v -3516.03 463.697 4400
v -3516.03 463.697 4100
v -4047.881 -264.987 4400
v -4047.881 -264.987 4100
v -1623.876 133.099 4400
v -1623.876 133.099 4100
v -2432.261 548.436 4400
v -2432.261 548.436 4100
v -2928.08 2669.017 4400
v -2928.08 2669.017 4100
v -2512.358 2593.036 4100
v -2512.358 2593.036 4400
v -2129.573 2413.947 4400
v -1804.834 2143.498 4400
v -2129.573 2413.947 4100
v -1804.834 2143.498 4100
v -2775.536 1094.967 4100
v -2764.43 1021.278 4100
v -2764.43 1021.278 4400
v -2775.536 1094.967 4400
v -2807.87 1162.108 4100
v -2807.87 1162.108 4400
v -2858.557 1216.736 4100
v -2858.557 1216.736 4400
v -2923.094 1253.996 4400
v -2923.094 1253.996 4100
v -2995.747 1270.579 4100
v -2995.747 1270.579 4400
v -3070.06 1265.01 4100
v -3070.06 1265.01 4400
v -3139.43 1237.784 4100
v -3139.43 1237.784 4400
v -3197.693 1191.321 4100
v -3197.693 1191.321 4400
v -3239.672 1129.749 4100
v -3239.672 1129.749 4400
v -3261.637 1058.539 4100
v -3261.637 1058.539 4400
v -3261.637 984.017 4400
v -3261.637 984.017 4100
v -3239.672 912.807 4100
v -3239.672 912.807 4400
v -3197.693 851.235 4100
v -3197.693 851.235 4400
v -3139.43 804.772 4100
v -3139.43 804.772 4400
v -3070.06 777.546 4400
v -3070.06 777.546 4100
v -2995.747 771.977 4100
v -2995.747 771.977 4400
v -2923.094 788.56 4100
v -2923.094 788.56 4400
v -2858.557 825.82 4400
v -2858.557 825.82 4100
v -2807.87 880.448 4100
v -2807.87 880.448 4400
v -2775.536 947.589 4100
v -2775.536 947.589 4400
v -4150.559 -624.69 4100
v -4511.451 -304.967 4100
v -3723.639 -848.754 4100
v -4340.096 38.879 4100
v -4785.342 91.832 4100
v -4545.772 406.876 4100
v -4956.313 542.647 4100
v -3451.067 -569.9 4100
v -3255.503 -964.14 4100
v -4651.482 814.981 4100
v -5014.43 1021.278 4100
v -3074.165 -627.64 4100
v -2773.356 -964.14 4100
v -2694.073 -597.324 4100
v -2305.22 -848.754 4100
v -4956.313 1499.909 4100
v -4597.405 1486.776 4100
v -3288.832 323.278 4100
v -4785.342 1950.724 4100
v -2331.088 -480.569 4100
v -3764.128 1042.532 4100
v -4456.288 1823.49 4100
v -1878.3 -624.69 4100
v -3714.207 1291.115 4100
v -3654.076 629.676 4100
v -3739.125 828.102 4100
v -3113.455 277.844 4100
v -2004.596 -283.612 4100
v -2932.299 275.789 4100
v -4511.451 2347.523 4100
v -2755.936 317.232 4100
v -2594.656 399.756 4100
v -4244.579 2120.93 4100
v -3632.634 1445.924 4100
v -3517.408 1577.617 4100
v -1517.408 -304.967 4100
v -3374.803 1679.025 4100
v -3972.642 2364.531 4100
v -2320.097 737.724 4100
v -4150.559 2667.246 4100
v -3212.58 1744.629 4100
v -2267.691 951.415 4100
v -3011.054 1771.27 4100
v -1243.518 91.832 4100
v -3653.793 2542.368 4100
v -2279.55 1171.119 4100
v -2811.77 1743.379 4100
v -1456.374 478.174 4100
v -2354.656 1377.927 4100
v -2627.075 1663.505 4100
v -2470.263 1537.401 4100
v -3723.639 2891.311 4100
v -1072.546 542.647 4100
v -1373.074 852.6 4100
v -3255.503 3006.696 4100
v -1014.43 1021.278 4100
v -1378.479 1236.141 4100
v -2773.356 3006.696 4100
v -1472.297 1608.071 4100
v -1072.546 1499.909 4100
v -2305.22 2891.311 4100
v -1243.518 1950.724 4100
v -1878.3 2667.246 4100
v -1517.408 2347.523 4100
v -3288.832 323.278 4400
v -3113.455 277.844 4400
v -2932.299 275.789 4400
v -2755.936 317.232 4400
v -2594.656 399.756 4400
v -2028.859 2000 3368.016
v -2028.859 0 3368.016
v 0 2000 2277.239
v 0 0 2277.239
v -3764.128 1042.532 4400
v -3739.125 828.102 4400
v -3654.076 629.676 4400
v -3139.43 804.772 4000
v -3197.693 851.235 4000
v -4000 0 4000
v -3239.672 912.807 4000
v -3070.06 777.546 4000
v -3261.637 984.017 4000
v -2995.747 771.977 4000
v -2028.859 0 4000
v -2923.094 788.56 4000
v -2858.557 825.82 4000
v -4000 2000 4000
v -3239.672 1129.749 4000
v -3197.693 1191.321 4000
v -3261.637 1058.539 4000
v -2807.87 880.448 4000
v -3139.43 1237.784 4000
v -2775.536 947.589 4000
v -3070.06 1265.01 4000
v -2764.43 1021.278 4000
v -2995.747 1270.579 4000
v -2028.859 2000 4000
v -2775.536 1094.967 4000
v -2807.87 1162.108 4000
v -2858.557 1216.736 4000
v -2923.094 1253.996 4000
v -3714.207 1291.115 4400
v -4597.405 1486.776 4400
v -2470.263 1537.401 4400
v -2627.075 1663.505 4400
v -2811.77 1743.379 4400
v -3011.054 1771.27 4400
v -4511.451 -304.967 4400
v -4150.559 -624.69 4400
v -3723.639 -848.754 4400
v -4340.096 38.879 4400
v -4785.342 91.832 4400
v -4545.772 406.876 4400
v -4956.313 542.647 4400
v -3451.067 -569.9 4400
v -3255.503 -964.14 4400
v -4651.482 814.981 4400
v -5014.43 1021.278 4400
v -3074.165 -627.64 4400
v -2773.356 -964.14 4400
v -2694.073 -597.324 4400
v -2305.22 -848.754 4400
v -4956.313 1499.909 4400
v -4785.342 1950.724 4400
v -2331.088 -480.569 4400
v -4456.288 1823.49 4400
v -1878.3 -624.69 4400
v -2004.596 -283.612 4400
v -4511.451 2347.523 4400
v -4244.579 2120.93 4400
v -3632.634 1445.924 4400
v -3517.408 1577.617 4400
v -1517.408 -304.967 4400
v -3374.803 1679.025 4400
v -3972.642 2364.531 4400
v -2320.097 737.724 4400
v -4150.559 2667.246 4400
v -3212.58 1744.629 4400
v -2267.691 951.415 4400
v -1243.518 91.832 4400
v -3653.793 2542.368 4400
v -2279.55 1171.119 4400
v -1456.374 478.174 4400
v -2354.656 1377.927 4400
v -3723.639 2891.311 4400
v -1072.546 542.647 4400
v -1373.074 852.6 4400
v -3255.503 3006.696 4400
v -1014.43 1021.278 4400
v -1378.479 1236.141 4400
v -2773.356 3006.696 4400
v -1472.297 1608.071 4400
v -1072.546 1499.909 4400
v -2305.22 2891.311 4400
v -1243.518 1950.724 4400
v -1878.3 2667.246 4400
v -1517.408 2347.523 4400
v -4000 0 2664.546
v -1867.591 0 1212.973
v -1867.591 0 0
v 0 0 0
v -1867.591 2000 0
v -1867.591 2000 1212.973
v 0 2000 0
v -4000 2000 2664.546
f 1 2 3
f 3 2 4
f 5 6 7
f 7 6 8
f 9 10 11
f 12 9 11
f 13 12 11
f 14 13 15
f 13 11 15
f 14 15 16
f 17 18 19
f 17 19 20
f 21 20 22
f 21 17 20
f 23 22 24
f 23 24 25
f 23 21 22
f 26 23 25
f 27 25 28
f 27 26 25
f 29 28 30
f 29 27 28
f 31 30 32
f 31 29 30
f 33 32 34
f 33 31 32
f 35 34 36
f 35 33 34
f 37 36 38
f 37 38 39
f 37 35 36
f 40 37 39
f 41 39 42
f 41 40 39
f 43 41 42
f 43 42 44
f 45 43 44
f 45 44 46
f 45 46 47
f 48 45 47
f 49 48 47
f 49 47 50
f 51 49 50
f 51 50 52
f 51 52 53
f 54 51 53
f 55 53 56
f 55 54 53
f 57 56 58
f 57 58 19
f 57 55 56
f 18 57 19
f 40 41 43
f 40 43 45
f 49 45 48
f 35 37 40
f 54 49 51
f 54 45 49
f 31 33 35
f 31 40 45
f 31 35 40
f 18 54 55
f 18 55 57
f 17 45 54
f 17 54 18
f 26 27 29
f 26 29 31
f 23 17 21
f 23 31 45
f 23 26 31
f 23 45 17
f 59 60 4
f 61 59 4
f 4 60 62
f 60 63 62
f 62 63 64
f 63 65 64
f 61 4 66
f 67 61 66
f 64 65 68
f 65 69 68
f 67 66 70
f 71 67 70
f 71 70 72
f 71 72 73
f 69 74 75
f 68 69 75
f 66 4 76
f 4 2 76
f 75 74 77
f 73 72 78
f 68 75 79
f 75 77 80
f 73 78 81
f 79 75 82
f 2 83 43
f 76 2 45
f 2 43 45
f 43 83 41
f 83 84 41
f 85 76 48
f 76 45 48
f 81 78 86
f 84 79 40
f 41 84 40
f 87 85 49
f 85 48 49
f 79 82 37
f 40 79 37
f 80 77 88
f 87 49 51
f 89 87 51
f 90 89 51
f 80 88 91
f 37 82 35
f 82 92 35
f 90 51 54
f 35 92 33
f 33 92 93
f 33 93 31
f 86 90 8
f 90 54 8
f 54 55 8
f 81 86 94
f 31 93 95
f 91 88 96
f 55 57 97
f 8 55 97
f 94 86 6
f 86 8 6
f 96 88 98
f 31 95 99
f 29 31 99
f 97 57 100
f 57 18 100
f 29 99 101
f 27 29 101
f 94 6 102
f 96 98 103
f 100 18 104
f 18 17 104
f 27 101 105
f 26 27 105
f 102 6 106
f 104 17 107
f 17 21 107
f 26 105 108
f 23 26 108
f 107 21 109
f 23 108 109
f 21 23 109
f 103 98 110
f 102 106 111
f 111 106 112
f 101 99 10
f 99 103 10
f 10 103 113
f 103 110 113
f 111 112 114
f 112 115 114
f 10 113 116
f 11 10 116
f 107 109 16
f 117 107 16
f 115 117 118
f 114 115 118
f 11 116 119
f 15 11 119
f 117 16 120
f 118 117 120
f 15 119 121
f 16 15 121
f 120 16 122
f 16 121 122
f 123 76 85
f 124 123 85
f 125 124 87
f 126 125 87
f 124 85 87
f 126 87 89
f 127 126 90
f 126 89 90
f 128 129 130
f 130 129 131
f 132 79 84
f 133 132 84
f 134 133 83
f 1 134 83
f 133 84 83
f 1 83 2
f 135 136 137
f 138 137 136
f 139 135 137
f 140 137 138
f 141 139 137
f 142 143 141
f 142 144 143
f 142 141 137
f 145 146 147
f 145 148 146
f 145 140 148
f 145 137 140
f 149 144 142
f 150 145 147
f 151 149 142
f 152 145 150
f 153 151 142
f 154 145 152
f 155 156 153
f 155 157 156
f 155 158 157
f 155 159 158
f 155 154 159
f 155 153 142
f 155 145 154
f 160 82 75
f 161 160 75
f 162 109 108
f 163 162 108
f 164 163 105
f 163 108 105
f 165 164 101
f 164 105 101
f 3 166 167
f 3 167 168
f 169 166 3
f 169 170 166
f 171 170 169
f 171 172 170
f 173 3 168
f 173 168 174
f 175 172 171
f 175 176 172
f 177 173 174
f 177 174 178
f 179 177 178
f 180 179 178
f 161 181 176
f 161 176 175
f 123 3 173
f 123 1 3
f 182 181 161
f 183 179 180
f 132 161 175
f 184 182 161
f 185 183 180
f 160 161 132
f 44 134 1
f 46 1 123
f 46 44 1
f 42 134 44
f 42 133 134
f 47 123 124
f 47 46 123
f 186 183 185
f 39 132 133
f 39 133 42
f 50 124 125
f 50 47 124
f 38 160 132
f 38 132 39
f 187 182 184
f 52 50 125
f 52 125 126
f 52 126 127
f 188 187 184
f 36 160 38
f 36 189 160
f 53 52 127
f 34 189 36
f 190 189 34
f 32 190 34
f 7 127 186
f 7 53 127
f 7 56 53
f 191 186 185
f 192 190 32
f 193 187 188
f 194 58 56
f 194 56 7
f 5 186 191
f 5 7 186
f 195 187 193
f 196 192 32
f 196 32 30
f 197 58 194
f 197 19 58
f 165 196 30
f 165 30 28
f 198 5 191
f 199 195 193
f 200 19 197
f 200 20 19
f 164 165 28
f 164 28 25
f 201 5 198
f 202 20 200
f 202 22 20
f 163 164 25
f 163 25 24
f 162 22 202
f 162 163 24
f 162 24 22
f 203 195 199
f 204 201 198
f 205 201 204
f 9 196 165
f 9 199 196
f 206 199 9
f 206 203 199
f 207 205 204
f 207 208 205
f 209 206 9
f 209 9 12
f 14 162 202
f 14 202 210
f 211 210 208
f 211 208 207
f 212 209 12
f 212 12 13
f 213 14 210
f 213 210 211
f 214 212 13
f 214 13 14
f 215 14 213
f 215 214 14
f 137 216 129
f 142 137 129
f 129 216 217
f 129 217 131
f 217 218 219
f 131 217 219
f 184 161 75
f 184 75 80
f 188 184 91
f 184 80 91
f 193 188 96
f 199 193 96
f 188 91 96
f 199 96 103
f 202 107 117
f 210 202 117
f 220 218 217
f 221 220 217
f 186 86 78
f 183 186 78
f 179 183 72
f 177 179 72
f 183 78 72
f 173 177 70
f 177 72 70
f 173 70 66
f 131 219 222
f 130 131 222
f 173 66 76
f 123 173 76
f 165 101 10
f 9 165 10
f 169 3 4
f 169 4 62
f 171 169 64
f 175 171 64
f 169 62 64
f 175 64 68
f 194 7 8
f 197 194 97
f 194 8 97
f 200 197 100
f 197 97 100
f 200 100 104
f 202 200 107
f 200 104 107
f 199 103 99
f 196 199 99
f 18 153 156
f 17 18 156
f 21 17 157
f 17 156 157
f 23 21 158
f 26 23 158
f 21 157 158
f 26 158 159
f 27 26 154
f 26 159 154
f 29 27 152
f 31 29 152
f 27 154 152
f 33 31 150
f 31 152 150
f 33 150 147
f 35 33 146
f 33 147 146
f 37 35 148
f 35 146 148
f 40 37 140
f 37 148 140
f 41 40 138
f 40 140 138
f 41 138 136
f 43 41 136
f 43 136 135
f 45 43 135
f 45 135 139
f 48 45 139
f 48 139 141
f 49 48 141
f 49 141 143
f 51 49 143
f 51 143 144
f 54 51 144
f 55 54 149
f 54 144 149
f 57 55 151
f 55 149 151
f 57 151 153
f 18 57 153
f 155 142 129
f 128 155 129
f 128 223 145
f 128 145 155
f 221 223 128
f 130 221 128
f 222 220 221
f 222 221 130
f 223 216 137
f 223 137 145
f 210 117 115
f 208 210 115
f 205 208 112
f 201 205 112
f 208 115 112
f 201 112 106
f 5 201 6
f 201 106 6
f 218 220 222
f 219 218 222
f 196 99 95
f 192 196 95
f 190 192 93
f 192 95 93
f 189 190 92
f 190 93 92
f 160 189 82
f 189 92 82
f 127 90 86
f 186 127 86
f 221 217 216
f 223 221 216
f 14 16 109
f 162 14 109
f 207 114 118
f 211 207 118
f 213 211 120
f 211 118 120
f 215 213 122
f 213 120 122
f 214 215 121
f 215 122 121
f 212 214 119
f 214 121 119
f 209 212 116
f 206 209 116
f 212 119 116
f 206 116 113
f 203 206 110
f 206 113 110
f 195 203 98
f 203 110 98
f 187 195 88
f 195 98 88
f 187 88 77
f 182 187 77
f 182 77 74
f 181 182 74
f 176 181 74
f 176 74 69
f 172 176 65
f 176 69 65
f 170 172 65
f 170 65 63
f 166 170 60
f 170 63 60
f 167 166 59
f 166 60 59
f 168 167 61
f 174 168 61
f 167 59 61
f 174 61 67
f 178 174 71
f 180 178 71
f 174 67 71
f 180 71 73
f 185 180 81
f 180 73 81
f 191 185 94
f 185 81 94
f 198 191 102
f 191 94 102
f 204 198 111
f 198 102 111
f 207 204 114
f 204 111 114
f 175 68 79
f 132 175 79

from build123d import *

# Parameters (mm, degrees)
F0_W     = 4000
F0_H     = 2000
F1_DEPTH = 4000
F3_DEPTH = 2000.001
F4_R     = 250
F5_DEPTH = 100
F6_R     = 2000
F6_R_2   = 250
F7_DEPTH = 300


with BuildPart() as f1:
    # F0 (on Top) → F1 (new body)
    with BuildSketch(Plane.XY):
        with Locations((-2000, 1000)):
            Rectangle(F0_W, F0_H)
    extrude(amount=F1_DEPTH)

    # F2 (on face) → F3 (cut, through all)
    with BuildSketch(Plane.XZ):
        Polygon((-4000, 0), (-1867.591262, 0), (-1867.591262, 1212.973237), (-4000, 2664.546013), align=None)
        Polygon((-2028.859377, 3368.016243), (0, 2277.239084), (0, 4000), (-2028.859377, 4000), align=None)
    extrude(amount=-F3_DEPTH, mode=Mode.SUBTRACT)

    # F4 (on face) → F5 (join)
    with BuildSketch(Plane.XY.offset(4000)):
        with Locations((-3014.429688, 1021.278024)):
            Circle(F4_R)
    extrude(amount=F5_DEPTH)


with BuildPart() as f7:
    # F6 (on face) → F7 (new body)
    with BuildSketch(Plane.XY.offset(4100)):
        with Locations((-3014.429688, 1021.278024)):
            Circle(F6_R)
        with BuildLine():
            ThreePointArc((-3764.128461, 1042.532435), (-3703.777403, 725.812748), (-3516.030461, 463.69694))
            Line((-3516.030461, 463.69694), (-4047.881339, -264.98699))
            ThreePointArc((-4047.881339, -264.98699), (-4454.735582, 216.281792), (-4651.482384, 814.980976))
            Line((-4651.482384, 814.980976), (-3764.128461, 1042.532435))
        make_face(mode=Mode.SUBTRACT)
        with BuildLine():
            ThreePointArc((-3288.831926, 323.278445), (-2932.299062, 275.788547), (-2594.655654, 399.755892))
            Line((-2594.655654, 399.755892), (-2004.596499, -283.6116))
            ThreePointArc((-2004.596499, -283.6116), (-2694.072541, -597.323625), (-3451.066861, -569.90015))
            Line((-3451.066861, -569.90015), (-3288.831926, 323.278445))
        make_face(mode=Mode.SUBTRACT)
        with BuildLine():
            ThreePointArc((-2432.260574, 548.436484), (-2267.690642, 951.415327), (-2354.655889, 1377.927058))
            Line((-2354.655889, 1377.927058), (-1472.296816, 1608.071177))
            ThreePointArc((-1472.296816, 1608.071177), (-1373.074274, 852.599619), (-1623.876358, 133.099305))
            Line((-1623.876358, 133.099305), (-2432.260574, 548.436484))
        make_face(mode=Mode.SUBTRACT)
        with BuildLine():
            Line((-3653.792696, 2542.368075), (-3212.580246, 1744.628808))
            ThreePointArc((-3212.580246, 1744.628808), (-3517.408192, 1577.616612), (-3714.206951, 1291.114608))
            Line((-3714.206951, 1291.114608), (-4597.405353, 1486.775657))
            ThreePointArc((-4597.405353, 1486.775657), (-4244.578513, 2120.929727), (-3653.792696, 2542.368075))
        make_face(mode=Mode.SUBTRACT)
        with Locations((-3014.429688, 1021.278024)):
            Circle(F6_R_2, mode=Mode.SUBTRACT)
        with BuildLine():
            ThreePointArc((-2928.079839, 2669.016991), (-2315.20795, 2515.797666), (-1804.834163, 2143.498441))
            Line((-1804.834163, 2143.498441), (-2470.263303, 1537.401018))
            ThreePointArc((-2470.263303, 1537.401018), (-2716.731548, 1709.66441), (-3011.05445, 1771.270429))
            Line((-3011.05445, 1771.270429), (-2928.079839, 2669.016991))
        make_face(mode=Mode.SUBTRACT)
    extrude(amount=F7_DEPTH)


solid = Compound([f1.part, f7.part])
